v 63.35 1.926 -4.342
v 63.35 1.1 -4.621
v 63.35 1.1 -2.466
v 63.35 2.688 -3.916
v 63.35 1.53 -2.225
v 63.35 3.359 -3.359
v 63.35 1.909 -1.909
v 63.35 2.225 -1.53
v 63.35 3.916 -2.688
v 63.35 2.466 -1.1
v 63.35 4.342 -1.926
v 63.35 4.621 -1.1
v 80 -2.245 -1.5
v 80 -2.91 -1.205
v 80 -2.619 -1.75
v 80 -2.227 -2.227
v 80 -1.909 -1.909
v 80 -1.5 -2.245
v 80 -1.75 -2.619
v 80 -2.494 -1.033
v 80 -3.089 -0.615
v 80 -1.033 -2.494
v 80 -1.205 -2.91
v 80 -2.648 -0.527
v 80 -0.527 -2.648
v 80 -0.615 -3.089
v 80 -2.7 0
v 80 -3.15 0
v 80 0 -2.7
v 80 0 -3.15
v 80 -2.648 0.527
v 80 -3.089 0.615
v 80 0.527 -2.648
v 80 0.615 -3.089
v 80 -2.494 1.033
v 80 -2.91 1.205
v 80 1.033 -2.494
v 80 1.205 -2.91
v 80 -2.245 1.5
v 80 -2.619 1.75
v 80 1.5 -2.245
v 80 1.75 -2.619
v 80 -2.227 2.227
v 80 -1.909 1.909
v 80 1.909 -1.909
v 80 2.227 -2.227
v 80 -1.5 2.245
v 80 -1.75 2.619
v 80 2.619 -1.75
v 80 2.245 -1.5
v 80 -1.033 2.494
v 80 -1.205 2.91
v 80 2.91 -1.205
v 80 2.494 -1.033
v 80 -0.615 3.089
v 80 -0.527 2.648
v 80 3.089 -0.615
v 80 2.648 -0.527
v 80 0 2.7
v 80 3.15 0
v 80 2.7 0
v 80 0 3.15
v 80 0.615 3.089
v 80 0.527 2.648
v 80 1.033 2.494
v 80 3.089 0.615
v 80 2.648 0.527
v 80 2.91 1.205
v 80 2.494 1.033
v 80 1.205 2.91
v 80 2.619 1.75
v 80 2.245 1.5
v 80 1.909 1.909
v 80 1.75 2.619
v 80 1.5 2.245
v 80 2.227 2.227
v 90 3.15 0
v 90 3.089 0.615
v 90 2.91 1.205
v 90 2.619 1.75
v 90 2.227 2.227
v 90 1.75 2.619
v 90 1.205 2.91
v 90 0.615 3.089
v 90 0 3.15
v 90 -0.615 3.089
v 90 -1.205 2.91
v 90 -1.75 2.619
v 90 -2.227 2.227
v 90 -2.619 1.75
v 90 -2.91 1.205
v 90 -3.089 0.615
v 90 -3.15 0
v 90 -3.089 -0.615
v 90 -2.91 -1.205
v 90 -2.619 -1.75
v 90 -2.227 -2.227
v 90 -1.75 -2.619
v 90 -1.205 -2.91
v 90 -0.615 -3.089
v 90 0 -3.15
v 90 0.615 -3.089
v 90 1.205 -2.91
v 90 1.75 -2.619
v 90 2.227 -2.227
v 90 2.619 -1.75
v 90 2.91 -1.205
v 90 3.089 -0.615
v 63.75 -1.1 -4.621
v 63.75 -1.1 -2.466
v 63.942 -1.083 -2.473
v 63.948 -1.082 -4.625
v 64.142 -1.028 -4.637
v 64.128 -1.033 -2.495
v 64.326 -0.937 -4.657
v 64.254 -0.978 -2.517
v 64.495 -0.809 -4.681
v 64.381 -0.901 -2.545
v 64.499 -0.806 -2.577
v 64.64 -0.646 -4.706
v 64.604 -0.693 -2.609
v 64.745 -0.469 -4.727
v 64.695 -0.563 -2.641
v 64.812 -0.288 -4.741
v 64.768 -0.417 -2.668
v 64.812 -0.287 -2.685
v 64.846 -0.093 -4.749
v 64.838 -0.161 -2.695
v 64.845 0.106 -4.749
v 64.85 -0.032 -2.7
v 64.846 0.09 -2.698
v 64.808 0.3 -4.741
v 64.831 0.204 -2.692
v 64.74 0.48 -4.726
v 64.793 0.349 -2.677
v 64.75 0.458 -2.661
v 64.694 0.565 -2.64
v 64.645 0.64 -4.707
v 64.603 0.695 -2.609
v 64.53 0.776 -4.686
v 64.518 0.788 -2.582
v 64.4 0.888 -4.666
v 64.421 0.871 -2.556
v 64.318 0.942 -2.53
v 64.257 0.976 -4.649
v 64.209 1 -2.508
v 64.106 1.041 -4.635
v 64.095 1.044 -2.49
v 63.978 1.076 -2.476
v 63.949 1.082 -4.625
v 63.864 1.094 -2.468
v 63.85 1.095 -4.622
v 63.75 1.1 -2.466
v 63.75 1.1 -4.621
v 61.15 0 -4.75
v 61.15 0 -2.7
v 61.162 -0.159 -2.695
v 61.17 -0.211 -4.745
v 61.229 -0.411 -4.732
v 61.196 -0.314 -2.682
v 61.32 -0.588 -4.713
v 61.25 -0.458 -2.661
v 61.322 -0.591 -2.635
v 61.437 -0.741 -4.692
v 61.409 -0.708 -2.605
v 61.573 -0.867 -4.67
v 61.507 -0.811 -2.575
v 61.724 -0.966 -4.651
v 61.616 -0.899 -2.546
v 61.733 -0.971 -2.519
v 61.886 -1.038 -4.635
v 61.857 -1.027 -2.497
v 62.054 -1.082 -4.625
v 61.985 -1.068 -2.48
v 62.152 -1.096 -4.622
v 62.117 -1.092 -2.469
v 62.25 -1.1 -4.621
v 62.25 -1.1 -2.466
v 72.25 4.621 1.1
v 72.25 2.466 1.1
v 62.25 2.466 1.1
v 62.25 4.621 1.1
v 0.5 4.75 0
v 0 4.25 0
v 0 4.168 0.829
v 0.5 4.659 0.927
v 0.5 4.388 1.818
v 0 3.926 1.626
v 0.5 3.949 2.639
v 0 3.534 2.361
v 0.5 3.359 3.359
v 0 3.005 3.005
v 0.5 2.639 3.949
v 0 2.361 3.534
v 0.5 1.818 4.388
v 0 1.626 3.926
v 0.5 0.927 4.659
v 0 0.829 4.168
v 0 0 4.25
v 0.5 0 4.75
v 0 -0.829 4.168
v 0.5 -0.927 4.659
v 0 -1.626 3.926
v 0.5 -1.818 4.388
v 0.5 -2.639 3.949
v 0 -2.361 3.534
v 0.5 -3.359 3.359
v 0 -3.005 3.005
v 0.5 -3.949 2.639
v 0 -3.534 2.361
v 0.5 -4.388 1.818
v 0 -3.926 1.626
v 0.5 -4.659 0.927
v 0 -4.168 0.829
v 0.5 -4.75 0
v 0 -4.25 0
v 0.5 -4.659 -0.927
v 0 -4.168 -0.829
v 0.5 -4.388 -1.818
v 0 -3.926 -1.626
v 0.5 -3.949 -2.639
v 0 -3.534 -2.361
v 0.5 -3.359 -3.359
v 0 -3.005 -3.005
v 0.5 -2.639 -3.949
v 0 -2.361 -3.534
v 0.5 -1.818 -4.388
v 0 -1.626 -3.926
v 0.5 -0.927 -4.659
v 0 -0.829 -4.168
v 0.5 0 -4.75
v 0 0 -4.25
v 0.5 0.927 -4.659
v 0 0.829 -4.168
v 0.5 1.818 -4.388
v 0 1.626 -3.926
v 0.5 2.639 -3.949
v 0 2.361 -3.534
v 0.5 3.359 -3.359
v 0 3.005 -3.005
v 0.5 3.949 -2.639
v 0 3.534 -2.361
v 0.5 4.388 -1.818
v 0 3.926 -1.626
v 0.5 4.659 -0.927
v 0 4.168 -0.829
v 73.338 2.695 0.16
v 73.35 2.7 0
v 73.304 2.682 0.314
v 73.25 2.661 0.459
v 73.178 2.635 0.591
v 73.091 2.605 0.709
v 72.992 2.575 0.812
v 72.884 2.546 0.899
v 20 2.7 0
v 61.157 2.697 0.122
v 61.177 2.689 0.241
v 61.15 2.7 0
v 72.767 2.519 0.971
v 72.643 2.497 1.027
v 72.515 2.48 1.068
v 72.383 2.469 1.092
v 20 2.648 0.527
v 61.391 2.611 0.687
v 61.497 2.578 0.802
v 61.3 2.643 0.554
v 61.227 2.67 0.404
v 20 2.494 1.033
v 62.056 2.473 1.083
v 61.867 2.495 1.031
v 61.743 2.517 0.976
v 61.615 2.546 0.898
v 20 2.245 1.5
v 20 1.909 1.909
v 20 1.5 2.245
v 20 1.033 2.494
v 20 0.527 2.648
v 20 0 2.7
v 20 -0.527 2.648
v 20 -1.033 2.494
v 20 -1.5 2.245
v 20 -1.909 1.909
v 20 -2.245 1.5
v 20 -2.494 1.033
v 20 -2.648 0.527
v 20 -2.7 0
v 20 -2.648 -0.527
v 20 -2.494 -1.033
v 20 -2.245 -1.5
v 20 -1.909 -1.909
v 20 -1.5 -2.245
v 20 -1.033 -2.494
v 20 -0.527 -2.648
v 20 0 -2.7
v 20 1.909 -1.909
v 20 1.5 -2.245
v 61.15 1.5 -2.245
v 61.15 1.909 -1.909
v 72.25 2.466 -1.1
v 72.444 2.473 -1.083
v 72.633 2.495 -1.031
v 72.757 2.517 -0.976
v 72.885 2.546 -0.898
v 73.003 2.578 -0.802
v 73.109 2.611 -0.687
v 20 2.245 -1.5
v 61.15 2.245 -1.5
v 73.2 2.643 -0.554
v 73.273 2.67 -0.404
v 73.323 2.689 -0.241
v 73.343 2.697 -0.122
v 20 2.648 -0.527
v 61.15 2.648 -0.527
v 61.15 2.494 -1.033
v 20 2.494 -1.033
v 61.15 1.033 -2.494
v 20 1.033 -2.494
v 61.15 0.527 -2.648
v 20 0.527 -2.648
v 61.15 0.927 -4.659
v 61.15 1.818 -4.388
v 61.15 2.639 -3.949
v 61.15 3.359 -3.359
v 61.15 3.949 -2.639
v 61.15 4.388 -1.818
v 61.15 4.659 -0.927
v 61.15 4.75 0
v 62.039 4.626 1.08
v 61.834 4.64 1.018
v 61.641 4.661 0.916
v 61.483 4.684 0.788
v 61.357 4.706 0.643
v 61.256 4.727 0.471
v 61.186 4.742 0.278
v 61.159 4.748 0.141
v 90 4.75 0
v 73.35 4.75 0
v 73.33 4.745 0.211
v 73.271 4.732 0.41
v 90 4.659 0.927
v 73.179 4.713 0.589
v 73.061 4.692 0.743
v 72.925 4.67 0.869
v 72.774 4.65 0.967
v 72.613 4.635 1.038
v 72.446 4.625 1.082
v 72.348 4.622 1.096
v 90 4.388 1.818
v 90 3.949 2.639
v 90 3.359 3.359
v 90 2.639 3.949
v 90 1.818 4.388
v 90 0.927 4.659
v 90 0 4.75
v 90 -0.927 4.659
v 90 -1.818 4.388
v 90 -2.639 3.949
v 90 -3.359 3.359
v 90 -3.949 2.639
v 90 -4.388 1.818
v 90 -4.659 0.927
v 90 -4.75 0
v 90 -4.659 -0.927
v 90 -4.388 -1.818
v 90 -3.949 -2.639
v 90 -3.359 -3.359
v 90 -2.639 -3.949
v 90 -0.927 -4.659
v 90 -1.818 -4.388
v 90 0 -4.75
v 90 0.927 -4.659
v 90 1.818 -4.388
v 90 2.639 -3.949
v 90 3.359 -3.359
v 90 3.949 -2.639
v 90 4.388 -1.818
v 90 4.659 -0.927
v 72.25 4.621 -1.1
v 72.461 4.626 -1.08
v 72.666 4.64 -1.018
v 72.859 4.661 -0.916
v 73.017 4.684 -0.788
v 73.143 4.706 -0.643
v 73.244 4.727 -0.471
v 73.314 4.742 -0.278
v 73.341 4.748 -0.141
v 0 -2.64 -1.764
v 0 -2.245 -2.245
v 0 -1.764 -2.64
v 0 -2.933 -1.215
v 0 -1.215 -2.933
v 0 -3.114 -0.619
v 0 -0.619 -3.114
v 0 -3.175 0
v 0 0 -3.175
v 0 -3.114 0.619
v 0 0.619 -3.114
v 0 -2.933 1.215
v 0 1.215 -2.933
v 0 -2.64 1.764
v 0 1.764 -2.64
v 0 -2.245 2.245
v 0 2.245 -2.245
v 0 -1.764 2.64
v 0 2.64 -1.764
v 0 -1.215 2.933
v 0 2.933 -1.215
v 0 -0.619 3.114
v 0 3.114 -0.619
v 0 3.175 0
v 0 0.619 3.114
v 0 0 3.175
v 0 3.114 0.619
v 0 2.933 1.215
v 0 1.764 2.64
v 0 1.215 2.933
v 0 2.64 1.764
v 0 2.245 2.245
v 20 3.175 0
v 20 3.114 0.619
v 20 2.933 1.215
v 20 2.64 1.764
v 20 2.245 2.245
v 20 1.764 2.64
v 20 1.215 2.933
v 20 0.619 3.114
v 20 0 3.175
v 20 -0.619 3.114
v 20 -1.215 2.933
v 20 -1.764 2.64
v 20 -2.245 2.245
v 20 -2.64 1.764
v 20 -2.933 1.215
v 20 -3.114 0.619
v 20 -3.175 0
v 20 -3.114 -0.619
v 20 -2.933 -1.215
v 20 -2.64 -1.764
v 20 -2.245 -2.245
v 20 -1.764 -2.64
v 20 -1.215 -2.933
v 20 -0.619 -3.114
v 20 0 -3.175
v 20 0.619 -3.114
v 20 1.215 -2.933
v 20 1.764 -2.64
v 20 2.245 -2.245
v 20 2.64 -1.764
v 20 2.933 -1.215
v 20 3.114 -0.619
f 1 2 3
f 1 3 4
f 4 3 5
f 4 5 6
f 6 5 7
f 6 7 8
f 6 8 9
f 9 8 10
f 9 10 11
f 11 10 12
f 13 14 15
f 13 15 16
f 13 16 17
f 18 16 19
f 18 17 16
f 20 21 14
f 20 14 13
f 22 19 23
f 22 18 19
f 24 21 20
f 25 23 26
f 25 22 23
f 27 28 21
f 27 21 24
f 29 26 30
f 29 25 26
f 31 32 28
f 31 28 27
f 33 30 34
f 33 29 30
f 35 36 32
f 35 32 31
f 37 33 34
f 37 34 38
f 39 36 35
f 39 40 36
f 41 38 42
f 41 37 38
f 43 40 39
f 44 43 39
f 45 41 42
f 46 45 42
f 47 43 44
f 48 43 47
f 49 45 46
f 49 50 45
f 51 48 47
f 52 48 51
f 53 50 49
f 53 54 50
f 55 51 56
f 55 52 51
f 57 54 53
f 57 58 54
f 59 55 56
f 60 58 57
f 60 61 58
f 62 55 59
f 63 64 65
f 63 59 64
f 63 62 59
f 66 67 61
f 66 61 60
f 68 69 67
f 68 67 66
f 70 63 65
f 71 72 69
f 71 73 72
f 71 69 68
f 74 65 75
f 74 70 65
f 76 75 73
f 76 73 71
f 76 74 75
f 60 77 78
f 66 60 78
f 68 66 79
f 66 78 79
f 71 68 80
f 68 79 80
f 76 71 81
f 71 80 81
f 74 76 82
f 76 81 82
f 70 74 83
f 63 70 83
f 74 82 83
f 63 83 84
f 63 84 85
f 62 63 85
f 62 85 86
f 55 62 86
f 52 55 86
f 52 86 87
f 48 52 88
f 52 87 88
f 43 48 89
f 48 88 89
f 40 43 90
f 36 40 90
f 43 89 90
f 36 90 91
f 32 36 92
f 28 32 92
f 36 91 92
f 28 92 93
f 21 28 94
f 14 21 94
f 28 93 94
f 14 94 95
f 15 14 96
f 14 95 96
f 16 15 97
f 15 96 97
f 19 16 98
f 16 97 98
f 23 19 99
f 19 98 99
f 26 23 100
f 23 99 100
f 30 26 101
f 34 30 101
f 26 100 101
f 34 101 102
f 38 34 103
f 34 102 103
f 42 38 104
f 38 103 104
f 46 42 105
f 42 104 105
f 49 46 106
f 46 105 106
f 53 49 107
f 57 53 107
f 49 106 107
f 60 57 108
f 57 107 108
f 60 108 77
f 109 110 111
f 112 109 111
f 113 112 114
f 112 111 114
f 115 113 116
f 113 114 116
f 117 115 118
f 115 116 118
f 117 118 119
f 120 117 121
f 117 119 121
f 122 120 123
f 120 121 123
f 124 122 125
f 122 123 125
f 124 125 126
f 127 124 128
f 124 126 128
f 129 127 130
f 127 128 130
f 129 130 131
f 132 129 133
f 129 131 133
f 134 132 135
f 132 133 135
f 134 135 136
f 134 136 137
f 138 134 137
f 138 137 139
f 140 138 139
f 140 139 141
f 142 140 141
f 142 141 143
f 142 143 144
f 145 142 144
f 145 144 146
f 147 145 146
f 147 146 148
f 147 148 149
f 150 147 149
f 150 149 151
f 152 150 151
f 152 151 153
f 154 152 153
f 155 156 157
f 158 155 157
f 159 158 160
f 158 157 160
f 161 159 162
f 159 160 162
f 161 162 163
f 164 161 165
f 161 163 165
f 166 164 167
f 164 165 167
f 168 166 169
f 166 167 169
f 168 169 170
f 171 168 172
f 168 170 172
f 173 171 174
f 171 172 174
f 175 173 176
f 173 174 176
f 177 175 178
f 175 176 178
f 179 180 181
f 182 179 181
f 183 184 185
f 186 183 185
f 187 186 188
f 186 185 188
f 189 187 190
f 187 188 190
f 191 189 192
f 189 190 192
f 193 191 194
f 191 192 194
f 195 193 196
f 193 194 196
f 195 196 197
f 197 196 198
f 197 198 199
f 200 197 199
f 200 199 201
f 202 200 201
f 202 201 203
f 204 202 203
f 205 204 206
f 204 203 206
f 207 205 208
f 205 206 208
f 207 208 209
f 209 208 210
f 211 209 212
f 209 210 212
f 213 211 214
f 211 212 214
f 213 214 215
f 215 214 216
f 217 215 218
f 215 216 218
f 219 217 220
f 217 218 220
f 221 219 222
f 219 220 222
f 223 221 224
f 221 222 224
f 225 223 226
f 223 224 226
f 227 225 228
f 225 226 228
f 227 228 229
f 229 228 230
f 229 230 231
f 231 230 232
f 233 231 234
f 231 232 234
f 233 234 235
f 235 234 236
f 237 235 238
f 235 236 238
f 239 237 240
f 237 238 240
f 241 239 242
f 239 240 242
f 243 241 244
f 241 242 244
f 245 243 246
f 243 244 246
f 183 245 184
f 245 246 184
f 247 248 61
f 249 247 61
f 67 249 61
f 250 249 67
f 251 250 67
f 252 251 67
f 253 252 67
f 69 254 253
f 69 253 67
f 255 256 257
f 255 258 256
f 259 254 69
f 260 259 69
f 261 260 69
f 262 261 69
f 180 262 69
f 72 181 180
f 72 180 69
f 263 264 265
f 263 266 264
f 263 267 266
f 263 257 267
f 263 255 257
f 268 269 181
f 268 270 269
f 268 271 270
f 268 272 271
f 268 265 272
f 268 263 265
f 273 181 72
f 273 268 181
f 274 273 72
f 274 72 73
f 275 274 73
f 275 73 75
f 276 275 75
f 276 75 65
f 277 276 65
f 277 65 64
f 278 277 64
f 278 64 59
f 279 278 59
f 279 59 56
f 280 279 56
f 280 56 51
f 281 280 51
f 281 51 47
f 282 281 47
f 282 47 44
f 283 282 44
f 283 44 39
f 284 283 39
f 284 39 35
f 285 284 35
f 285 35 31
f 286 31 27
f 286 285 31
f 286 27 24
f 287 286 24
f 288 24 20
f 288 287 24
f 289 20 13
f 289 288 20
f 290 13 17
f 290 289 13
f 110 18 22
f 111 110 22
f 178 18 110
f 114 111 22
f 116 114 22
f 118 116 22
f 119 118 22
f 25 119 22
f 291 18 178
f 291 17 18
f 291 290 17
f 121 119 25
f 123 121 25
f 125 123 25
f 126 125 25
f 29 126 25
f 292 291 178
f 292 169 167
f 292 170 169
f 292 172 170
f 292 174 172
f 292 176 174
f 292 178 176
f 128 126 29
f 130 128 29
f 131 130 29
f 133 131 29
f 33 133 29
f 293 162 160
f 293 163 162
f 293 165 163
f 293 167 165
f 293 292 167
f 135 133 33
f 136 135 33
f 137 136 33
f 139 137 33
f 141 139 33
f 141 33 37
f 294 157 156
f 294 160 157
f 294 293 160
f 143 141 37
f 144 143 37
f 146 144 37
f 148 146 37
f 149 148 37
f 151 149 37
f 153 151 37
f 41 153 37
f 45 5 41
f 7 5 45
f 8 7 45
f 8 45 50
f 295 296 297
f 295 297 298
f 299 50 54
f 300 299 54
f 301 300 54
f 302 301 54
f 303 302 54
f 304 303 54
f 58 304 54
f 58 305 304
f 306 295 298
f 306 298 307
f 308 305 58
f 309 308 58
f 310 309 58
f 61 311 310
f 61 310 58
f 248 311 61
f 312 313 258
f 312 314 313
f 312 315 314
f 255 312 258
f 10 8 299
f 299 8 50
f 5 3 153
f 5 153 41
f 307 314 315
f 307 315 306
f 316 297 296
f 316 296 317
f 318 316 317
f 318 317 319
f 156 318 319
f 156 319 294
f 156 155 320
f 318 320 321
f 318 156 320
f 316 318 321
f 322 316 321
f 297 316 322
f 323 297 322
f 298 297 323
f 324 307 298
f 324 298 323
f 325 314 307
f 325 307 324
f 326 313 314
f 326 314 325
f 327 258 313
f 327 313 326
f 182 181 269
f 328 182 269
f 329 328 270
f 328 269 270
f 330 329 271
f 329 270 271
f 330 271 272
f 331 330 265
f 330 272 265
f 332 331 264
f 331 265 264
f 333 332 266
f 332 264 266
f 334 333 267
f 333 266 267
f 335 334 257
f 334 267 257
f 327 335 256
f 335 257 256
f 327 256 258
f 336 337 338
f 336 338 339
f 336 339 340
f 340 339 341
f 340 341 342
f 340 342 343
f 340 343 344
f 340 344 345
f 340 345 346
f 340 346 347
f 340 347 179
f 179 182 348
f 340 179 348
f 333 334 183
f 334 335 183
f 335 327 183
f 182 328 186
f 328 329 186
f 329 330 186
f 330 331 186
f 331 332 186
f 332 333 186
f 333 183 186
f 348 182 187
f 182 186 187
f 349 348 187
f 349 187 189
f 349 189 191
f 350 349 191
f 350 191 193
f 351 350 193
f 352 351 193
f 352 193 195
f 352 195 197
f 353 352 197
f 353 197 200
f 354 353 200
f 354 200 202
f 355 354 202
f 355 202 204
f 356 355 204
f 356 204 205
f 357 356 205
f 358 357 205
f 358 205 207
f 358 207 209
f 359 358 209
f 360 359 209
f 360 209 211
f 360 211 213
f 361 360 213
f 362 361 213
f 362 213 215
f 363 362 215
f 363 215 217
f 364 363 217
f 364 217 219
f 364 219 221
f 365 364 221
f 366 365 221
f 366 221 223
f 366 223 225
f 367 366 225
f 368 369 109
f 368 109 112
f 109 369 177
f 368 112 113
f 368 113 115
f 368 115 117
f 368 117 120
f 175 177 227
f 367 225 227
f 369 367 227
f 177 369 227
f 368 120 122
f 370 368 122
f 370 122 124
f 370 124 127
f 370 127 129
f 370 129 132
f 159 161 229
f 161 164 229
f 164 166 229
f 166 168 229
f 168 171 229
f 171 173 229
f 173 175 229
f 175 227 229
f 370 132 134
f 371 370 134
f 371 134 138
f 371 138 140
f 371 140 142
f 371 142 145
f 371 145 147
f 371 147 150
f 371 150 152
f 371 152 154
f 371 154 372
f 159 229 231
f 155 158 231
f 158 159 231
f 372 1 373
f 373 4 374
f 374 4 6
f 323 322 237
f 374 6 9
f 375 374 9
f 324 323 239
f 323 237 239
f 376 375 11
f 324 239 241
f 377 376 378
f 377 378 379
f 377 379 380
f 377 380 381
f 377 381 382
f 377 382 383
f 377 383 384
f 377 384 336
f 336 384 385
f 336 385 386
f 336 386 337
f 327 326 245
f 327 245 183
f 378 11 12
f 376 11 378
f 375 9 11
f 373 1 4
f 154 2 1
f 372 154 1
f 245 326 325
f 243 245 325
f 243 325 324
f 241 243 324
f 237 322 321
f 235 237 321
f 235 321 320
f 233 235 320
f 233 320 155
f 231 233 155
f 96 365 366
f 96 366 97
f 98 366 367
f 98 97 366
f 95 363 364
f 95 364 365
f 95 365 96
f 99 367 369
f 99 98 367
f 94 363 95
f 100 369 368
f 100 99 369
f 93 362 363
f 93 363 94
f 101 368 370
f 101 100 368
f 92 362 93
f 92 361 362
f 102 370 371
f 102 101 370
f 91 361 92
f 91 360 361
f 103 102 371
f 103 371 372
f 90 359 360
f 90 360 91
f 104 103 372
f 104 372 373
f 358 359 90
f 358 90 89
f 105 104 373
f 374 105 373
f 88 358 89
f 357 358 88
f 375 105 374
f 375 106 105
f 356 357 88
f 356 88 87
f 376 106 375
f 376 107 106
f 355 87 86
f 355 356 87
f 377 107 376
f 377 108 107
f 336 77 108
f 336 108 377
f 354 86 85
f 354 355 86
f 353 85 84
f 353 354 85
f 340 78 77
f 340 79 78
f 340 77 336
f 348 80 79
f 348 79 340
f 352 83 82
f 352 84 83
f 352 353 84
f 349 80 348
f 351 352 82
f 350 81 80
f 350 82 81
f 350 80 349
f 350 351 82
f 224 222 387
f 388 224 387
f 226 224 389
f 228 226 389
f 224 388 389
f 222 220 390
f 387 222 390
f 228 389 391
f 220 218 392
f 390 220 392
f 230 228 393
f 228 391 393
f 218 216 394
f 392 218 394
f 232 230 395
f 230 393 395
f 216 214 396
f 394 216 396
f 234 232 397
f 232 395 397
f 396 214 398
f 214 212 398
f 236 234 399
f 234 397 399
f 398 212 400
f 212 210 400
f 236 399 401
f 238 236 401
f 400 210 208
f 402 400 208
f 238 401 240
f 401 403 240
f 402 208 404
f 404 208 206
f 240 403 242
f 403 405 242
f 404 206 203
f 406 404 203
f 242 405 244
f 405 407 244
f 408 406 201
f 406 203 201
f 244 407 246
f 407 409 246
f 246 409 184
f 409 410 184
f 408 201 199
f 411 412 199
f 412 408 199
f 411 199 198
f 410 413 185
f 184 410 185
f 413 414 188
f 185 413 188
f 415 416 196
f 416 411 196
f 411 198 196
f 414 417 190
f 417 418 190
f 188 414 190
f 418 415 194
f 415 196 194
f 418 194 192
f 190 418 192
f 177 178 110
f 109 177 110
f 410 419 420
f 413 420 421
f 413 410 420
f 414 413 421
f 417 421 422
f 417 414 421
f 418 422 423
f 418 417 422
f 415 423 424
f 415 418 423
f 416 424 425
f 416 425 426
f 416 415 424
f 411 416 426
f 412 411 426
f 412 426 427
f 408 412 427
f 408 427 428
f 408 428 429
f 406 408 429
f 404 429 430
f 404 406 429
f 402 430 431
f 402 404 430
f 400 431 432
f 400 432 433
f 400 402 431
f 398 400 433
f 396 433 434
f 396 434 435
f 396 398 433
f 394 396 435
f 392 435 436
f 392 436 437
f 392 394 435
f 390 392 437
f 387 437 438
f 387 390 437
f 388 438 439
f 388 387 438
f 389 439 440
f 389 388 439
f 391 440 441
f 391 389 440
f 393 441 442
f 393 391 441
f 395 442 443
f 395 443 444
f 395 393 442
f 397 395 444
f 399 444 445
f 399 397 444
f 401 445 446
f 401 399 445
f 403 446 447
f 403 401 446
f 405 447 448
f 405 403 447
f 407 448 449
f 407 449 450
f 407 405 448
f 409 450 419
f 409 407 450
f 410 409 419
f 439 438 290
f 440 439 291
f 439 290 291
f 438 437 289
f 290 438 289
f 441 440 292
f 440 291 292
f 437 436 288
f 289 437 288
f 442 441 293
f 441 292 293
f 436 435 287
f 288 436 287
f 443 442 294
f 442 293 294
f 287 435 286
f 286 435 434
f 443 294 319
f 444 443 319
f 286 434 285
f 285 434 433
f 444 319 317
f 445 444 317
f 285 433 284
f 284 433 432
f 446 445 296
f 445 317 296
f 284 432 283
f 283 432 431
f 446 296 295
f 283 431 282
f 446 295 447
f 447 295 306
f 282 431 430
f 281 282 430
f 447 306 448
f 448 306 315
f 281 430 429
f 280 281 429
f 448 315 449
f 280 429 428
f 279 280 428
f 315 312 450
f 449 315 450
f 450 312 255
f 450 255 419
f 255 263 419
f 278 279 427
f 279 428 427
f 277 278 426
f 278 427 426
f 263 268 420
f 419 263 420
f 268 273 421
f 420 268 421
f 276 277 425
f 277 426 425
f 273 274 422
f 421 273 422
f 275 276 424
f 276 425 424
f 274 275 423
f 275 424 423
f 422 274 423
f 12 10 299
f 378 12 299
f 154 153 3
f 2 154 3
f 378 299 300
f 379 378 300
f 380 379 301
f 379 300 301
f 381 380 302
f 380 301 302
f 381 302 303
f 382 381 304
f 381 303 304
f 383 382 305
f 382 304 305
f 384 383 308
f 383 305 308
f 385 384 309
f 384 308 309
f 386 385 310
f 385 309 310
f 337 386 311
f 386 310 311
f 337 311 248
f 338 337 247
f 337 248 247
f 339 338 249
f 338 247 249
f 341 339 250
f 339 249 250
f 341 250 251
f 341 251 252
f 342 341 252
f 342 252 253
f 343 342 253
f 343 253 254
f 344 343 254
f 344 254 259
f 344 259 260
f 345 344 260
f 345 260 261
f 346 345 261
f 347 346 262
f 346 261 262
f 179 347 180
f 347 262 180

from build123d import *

# Parameters (mm, degrees)
F0_R      = 4.75
F1_DEPTH  = 90
F2_R      = 2.7
F3_DEPTH  = 100
F4_R      = 3.175
F5_DEPTH  = 20
F6_R      = 3.15
F6_R_2    = 2.7
F7_DEPTH  = 10
F9_DEPTH  = 25
F11_DEPTH = 25
F14_DEPTH = 1.1
F15_SIZE  = 0.5


with BuildPart() as f1:
    # F0 (on Right) → F1 (new body)
    with BuildSketch(Plane.YZ):
        Circle(F0_R)
    extrude(amount=F1_DEPTH)

    # F2 (on Right) → F3 (cut)
    with BuildSketch(Plane.YZ):
        Circle(F2_R)
    extrude(amount=F3_DEPTH, mode=Mode.SUBTRACT)

    # F4 (on Right) → F5 (cut)
    with BuildSketch(Plane.YZ):
        Circle(F4_R)
    extrude(amount=F5_DEPTH, mode=Mode.SUBTRACT)

    # F6 (on face) → F7 (cut)
    with BuildSketch(Plane.YZ.offset(90)):
        Circle(F6_R)
        Circle(F6_R_2, mode=Mode.SUBTRACT)
    extrude(amount=-F7_DEPTH, mode=Mode.SUBTRACT)

    # F8 (on Front) → F9 (cut)
    with BuildSketch(Plane.XZ):
        with BuildLine():
            ThreePointArc((72.25, -1.1), (73.35, 0), (72.25, 1.1))
            Line((72.25, 1.1), (62.25, 1.1))
            ThreePointArc((62.25, 1.1), (61.15, 0), (62.25, -1.1))
            Line((62.25, -1.1), (72.25, -1.1))
        make_face()
    extrude(amount=-F9_DEPTH, mode=Mode.SUBTRACT)

    # F10 (on Top) → F11 (cut)
    with BuildSketch(Plane.XY):
        with BuildLine():
            ThreePointArc((62.25, 1.1), (61.15, 0), (62.25, -1.1))
            Line((62.25, -1.1), (63.75, -1.1))
            ThreePointArc((63.75, -1.1), (64.85, 0), (63.75, 1.1))
            Line((63.75, 1.1), (62.25, 1.1))
        make_face()
    extrude(amount=-F11_DEPTH, mode=Mode.SUBTRACT)

    # F13 (on offset) → F14 (cut, symmetric)
    with BuildSketch(Plane.YZ.offset(62.25)):
        with BuildLine():
            Line((0, 0), (0, -11.794144941))
            ThreePointArc((0, -11.794144941), (8.3397198661, -8.3397198661), (11.794144941, 0))
            Line((11.794144941, 0), (0, 0))
        make_face()
    extrude(amount=F14_DEPTH, both=True, mode=Mode.SUBTRACT)

    # F15
    f15_edges = [f1.edges().sort_by_distance(p)[0] for p in [
        (0, -4.75, 0),
    ]]
    chamfer(f15_edges, length=F15_SIZE)


solid = f1.part
